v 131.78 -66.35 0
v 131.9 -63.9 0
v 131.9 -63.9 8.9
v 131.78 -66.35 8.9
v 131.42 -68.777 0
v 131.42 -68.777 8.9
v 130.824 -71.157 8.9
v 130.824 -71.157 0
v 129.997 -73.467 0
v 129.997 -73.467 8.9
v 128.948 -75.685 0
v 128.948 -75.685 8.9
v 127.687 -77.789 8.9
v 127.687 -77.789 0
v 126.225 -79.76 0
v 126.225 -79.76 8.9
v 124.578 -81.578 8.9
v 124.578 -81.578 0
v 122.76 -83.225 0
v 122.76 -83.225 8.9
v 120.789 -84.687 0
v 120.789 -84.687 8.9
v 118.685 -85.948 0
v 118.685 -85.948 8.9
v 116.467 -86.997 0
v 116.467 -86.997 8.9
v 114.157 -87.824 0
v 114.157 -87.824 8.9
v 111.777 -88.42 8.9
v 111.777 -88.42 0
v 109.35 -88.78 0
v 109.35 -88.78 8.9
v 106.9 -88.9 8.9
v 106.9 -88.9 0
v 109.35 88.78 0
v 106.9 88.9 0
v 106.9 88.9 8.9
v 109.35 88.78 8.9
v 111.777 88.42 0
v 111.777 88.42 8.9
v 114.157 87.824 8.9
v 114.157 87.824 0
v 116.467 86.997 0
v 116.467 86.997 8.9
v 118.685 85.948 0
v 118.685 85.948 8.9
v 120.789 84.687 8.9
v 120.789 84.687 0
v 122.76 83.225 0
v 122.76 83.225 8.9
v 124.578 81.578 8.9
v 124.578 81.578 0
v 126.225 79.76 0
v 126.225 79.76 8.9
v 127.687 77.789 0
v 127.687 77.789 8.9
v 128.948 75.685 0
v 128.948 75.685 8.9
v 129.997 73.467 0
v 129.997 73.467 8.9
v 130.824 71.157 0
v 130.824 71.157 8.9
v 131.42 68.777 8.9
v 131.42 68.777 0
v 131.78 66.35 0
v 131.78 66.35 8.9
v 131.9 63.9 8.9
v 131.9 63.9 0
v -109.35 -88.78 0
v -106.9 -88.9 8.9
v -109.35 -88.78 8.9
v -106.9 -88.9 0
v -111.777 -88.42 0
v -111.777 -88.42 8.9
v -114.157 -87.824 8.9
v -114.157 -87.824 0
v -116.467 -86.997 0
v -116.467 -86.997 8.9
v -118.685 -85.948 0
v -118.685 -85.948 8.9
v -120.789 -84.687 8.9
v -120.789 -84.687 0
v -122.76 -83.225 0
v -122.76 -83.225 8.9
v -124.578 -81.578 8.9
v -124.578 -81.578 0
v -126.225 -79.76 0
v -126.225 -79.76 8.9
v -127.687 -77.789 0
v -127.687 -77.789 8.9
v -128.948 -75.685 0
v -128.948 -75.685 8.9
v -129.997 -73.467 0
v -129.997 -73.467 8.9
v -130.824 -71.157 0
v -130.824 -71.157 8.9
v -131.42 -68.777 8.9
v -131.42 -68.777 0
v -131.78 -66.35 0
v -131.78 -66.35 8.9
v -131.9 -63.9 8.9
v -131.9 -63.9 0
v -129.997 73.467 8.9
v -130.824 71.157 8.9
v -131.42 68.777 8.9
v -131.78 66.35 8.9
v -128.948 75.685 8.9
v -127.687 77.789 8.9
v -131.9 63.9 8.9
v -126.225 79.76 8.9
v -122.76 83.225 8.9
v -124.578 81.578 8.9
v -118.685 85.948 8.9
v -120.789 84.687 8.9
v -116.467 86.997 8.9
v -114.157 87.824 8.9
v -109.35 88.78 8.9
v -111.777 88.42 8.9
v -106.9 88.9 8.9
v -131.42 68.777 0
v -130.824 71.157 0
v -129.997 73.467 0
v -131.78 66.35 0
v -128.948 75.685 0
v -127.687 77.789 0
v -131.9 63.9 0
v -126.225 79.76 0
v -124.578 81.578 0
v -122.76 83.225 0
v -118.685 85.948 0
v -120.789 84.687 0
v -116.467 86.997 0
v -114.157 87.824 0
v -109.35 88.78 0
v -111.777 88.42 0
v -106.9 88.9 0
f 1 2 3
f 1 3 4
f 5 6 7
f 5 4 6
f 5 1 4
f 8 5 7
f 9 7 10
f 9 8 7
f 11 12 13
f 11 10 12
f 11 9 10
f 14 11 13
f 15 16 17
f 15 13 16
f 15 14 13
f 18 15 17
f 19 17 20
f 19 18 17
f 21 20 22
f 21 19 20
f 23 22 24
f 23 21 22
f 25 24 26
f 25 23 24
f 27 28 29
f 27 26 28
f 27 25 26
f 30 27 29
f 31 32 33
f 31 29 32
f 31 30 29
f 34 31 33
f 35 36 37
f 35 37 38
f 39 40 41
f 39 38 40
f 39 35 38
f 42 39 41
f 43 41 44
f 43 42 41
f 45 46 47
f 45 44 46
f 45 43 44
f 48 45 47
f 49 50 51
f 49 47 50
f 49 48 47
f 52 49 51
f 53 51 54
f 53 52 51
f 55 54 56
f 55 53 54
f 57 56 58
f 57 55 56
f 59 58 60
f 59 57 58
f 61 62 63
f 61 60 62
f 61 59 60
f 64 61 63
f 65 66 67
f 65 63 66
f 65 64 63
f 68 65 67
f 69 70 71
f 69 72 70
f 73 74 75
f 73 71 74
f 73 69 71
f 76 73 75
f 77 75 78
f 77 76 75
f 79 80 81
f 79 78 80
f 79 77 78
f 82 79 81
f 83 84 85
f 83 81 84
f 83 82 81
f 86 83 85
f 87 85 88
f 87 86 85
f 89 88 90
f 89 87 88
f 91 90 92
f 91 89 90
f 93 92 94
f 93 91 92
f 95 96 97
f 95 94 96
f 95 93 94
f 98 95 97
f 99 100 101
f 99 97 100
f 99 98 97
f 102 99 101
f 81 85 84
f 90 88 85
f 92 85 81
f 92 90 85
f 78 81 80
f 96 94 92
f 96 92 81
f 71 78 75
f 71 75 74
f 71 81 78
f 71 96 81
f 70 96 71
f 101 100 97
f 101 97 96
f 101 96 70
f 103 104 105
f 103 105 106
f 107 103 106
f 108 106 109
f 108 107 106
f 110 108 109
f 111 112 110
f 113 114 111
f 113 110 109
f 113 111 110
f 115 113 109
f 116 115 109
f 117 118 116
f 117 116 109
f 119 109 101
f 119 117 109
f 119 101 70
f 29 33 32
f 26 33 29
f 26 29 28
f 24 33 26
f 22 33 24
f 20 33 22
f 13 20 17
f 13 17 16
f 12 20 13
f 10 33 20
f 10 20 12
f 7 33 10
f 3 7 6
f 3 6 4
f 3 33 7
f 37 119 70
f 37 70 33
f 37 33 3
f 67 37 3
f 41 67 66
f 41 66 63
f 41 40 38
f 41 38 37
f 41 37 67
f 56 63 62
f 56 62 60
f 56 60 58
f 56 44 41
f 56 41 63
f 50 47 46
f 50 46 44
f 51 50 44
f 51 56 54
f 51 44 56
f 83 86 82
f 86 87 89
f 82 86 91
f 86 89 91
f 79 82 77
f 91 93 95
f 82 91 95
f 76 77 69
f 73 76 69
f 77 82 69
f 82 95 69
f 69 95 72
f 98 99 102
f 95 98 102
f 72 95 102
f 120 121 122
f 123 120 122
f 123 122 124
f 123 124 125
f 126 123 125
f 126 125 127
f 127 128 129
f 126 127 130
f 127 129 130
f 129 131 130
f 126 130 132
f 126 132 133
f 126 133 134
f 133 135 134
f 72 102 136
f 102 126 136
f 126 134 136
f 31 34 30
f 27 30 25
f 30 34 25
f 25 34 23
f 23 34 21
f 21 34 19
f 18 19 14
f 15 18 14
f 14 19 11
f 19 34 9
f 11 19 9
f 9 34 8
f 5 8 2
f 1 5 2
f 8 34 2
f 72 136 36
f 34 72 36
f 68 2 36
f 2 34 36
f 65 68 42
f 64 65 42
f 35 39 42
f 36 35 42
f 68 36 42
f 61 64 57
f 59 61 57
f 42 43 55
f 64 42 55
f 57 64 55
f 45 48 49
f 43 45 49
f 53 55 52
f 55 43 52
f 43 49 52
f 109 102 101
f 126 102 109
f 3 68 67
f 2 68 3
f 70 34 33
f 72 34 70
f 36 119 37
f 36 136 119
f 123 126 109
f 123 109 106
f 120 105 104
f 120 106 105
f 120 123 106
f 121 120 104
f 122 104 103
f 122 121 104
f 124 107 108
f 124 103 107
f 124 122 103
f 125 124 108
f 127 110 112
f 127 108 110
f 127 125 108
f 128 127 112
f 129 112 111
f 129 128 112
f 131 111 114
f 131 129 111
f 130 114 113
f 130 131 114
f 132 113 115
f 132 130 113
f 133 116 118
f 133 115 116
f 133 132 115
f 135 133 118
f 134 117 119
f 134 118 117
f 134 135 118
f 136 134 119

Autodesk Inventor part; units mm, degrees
ref_plane "YZ Plane" through (0, 0, 0) normal (1, 0, 0) x (0, 1, 0)
ref_plane "XZ Plane" through (0, 0, 0) normal (0, 1, 0) x (-1, 0, 0)
ref_plane "XY Plane" through (0, 0, 0) normal (0, 0, 1) x (1, 0, 0)
sketch "Skizze1" plane through (0, 0, 0) normal (0, 0, 1) x (1, 0, 0)
  line L0 (-191.9087, 0) -> (191.9087, 0) projected
  line L1 (0, -131.7087) -> (0, 131.7087) projected
  line L2 (-106.9, 88.9) -> (106.9, 88.9)
  line L3 (131.9, 63.9) -> (131.9, -63.9)
  line L4 (106.9, -88.9) -> (-106.9, -88.9)
  line L5 (-131.9, -63.9) -> (-131.9, 63.9)
  arc A0 (-106.9, 88.9) -> (-131.9, 63.9) centre (-106.9, 63.9) ccw
  arc A1 (131.9, 63.9) -> (106.9, 88.9) centre (106.9, 63.9) ccw
  arc A2 (106.9, -88.9) -> (131.9, -63.9) centre (106.9, -63.9) ccw
  arc A3 (-131.9, -63.9) -> (-106.9, -88.9) centre (-106.9, -63.9) ccw
  point P0 (0, 0)
  point P1 (131.9, -88.9)
  point P2 (131.9, 88.9)
  dimension "d0" = 263.8
  dimension "d1" = 177.8
  dimension "d2" = 25
extrude "Extrusion1" add sketch "Skizze1" along normal blind 8.9
properties part number "Tablet - Nexus 10"
